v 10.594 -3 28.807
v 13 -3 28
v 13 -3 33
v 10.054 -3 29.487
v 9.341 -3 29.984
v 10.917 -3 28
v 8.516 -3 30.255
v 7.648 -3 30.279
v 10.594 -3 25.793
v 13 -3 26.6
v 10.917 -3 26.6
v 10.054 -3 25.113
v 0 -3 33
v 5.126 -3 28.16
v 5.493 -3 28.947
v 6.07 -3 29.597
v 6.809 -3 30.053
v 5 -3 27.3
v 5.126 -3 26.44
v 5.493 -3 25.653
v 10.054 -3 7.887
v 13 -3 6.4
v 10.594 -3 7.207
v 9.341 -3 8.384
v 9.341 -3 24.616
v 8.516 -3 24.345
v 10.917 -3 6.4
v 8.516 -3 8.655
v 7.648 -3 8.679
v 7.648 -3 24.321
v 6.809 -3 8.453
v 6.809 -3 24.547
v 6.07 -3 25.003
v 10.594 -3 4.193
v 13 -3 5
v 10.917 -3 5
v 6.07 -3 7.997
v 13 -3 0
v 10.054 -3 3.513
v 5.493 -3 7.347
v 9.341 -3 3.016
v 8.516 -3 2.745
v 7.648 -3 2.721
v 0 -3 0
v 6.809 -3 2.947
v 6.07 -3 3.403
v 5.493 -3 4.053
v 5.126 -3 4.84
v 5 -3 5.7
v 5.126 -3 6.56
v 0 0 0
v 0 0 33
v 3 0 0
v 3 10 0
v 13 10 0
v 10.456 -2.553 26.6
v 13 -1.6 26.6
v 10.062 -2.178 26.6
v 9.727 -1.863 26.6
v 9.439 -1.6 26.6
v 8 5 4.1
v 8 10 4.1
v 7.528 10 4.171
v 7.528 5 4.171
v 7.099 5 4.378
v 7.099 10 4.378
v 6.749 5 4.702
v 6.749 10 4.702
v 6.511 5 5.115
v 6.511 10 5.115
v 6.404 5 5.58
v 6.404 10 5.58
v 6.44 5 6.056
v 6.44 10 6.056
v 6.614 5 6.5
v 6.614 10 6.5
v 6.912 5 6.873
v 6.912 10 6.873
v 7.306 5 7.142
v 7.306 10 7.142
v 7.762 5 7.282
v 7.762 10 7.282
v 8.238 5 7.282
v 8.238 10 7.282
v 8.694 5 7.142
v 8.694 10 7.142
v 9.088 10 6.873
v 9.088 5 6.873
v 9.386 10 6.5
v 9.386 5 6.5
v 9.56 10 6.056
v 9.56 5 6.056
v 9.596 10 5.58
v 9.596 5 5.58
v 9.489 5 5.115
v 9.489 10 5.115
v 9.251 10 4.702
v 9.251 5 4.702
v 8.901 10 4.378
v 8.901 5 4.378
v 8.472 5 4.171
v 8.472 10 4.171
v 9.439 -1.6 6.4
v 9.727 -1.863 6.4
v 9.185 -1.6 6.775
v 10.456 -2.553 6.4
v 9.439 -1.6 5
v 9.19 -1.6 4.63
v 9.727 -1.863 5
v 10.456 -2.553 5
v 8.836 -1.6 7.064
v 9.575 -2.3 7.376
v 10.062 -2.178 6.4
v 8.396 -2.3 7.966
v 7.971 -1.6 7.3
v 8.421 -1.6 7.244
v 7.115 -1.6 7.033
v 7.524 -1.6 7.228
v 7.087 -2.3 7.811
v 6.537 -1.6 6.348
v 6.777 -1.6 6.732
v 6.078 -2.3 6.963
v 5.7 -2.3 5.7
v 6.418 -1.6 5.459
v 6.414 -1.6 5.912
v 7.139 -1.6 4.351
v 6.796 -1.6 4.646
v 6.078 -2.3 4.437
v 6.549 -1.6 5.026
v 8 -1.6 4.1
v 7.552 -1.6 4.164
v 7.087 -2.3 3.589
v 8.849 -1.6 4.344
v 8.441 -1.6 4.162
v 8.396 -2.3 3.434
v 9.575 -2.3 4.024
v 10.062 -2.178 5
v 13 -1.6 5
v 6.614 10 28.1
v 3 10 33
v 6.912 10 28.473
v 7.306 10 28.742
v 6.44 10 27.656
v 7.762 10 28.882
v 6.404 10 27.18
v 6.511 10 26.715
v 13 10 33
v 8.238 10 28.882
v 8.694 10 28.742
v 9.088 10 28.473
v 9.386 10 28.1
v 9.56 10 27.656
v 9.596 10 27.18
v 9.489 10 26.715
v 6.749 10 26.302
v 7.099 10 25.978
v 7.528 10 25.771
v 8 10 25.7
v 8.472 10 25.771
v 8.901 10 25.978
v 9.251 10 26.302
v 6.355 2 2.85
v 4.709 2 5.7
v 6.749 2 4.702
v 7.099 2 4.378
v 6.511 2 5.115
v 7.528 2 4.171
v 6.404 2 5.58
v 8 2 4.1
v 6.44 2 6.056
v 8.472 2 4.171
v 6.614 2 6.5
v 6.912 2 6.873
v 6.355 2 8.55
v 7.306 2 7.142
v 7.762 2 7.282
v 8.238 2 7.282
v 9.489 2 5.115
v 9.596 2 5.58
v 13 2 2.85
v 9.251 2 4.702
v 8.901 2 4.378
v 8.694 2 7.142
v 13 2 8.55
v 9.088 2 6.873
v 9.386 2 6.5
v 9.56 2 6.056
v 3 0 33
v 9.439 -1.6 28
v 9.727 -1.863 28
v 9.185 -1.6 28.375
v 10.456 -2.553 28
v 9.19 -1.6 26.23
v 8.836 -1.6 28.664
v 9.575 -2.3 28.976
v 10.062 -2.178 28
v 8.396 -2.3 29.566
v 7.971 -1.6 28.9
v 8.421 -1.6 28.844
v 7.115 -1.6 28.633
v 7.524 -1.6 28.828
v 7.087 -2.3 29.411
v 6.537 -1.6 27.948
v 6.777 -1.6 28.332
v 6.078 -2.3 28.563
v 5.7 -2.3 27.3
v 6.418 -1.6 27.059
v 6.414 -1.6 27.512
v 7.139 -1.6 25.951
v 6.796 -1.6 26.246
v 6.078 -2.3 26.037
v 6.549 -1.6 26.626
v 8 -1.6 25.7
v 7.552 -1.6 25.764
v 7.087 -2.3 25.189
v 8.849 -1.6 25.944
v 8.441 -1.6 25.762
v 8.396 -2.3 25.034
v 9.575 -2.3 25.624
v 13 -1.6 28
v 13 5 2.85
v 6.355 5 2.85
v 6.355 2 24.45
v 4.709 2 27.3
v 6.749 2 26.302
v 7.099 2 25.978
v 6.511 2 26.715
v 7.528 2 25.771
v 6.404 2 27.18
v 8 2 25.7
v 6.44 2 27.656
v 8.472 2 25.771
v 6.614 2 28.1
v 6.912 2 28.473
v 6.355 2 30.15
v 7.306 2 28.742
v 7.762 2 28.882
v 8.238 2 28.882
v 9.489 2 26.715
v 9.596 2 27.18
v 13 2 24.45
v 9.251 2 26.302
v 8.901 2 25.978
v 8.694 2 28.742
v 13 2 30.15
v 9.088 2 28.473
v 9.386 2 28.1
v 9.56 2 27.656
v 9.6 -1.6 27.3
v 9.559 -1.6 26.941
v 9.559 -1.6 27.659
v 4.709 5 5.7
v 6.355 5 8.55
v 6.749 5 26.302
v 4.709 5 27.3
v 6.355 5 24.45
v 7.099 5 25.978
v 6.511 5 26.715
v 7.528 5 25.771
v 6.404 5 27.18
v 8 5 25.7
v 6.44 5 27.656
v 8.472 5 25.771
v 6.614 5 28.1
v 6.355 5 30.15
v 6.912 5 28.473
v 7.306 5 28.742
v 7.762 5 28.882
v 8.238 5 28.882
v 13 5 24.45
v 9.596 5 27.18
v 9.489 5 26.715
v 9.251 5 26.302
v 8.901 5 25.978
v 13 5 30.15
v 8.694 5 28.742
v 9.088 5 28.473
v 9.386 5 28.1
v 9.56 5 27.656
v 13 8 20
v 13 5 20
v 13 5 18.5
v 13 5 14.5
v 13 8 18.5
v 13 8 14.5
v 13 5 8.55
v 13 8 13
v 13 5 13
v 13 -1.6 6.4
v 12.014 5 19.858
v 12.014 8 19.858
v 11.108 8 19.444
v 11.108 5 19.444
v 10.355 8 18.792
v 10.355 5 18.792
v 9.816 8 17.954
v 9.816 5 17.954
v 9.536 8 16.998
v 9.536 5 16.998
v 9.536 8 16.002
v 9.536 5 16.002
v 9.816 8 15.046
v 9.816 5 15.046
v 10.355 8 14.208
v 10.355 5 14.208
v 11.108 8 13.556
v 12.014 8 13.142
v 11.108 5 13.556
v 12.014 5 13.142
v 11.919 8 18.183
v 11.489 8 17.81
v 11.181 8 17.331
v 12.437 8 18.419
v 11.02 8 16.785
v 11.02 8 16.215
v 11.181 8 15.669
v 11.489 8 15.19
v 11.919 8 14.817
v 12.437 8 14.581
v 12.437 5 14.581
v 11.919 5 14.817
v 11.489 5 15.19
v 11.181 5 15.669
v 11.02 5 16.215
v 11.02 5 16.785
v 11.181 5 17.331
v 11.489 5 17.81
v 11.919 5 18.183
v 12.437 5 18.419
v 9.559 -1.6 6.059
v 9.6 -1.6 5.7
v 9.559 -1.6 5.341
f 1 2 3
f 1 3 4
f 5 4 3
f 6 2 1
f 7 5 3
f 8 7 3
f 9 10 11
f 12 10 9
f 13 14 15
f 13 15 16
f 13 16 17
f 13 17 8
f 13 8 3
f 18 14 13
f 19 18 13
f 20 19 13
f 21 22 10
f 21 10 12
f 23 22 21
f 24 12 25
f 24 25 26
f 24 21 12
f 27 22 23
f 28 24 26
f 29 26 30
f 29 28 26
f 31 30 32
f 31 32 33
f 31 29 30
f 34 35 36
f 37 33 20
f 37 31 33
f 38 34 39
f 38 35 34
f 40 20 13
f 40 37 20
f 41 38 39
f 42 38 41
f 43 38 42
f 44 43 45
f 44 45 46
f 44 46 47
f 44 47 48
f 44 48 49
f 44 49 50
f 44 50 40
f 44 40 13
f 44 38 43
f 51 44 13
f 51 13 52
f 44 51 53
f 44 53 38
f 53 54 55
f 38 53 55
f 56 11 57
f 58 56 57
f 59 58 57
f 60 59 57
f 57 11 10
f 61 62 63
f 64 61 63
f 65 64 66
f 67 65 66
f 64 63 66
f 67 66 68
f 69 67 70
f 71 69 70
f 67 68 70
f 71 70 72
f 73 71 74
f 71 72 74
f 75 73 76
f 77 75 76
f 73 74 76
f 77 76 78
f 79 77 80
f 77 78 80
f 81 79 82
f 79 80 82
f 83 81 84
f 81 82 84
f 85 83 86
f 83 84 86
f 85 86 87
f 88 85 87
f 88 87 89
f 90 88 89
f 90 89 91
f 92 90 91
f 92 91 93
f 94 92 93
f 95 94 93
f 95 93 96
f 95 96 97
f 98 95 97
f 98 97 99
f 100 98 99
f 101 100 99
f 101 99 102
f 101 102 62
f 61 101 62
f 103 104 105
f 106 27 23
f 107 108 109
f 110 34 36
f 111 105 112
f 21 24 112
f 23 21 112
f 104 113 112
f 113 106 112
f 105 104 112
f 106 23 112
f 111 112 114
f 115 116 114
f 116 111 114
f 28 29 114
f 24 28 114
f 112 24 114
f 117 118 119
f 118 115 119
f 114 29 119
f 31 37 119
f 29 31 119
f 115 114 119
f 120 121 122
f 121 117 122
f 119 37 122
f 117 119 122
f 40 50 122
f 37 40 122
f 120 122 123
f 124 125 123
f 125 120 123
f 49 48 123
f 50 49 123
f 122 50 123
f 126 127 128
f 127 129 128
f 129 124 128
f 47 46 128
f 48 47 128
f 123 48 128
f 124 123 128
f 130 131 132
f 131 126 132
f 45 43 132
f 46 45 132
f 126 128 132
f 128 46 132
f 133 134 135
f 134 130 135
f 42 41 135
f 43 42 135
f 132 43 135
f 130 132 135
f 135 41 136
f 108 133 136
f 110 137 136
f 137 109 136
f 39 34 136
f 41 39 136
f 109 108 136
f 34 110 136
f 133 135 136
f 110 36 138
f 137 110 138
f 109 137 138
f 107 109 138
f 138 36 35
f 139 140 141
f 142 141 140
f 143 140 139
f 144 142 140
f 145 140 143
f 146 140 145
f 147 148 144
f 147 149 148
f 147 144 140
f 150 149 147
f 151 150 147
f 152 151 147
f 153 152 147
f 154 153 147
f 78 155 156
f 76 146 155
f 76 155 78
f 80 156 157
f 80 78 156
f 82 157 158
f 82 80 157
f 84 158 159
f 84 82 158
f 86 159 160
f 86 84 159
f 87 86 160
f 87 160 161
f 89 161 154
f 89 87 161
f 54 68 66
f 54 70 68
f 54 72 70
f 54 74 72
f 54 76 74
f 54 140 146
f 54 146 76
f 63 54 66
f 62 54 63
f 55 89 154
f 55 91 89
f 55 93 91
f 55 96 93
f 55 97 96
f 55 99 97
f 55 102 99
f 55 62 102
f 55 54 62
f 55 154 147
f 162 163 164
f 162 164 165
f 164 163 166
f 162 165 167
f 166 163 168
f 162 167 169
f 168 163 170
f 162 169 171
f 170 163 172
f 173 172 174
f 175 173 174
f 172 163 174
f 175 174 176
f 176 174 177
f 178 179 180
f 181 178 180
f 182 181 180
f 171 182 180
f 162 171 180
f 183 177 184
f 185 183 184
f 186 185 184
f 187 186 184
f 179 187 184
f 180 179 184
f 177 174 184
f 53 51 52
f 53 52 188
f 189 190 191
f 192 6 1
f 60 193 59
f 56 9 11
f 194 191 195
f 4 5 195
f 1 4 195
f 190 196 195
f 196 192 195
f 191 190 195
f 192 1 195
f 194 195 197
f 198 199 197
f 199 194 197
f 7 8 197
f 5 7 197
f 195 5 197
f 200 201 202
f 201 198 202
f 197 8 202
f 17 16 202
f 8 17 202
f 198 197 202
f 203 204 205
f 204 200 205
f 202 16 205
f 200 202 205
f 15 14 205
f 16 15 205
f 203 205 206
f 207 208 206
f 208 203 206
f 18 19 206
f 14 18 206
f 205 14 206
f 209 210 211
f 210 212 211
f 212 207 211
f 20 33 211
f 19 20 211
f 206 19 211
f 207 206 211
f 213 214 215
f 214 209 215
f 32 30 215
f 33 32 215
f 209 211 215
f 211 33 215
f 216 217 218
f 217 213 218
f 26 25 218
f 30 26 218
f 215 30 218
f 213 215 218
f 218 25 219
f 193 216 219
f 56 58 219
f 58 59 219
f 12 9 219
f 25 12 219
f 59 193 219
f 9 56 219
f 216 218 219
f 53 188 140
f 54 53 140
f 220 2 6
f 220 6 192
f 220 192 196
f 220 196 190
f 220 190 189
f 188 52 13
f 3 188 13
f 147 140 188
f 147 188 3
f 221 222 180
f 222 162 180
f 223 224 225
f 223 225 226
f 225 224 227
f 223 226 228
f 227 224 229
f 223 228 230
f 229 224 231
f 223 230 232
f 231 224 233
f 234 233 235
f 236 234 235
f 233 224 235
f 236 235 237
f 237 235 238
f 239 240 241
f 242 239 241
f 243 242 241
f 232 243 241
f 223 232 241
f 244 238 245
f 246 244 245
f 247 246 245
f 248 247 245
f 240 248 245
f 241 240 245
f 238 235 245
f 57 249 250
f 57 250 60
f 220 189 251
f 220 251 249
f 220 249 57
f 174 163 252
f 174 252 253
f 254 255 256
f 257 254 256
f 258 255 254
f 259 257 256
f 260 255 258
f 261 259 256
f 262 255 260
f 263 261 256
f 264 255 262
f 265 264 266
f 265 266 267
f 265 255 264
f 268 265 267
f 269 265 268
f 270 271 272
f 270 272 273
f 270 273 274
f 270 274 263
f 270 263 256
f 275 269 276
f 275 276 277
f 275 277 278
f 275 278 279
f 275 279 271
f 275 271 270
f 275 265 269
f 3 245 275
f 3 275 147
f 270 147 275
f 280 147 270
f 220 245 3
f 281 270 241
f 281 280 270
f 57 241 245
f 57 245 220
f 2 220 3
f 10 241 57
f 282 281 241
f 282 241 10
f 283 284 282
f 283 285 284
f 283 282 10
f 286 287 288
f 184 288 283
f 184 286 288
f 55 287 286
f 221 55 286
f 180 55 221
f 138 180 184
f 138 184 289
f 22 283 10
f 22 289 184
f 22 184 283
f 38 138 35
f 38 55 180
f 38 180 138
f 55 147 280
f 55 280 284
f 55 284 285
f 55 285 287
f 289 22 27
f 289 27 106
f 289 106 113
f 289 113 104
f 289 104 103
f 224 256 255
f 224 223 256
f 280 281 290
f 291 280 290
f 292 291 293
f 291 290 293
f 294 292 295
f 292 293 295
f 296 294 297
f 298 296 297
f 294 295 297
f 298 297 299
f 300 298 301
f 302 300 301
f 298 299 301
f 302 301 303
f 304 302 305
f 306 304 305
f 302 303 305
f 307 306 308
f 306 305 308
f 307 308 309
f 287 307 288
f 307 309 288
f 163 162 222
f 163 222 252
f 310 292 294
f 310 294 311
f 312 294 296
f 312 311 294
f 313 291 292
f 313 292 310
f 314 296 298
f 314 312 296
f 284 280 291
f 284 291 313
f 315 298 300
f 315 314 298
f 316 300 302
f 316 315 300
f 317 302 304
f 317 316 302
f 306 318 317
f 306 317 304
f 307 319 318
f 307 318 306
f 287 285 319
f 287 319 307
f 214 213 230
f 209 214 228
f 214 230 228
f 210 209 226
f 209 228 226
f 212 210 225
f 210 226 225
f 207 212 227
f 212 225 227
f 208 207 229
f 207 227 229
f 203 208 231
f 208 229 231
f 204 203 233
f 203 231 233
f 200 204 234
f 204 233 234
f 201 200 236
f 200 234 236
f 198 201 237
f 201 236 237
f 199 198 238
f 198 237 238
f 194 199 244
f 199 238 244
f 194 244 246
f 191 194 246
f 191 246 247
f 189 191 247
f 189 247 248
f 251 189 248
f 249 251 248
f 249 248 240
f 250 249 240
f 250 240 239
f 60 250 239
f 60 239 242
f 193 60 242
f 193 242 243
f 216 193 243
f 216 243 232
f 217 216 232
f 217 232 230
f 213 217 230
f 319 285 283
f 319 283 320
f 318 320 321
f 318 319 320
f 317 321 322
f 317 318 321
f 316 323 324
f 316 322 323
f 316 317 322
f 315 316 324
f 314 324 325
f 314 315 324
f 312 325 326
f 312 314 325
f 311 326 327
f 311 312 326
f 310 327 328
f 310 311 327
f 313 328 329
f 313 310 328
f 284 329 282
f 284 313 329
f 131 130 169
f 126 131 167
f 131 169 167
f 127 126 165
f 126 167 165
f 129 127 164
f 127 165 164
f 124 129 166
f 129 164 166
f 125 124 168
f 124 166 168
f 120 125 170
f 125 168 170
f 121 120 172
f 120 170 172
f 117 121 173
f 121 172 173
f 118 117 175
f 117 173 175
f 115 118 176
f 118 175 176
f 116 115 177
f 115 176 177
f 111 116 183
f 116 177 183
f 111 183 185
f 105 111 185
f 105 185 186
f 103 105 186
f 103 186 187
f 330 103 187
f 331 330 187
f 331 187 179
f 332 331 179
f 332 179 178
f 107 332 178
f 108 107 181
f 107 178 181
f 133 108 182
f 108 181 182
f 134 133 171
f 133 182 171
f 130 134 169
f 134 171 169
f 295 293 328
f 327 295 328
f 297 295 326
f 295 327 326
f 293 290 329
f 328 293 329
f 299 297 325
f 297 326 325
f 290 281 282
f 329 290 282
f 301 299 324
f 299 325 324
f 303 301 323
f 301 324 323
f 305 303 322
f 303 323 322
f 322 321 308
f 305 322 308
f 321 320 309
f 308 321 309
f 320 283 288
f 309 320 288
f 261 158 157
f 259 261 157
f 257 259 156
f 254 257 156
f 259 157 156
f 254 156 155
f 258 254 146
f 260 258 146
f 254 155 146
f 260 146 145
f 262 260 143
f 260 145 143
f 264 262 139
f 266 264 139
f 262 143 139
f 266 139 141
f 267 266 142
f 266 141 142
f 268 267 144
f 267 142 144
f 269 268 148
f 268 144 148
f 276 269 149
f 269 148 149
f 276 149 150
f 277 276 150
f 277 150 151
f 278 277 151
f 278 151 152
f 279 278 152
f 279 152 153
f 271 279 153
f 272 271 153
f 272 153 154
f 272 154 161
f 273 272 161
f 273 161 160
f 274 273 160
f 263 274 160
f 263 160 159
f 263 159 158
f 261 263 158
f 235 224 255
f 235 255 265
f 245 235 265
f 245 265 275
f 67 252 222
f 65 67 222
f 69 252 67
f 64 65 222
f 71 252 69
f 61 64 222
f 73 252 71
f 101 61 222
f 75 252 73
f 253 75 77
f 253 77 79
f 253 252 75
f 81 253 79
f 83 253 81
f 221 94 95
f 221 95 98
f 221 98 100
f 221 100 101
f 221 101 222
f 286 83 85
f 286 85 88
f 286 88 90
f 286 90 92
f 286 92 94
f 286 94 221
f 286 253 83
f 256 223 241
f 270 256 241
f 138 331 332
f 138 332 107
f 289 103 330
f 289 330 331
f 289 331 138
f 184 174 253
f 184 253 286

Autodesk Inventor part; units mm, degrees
ref_plane "YZ Plane" through (0, 0, 0) normal (1, 0, 0) x (0, 1, 0)
ref_plane "XZ Plane" through (0, 0, 0) normal (0, 1, 0) x (-1, 0, 0)
sketch "Sketch1" plane through (0, 0, 0) normal (0, 0, 1) x (1, 0, 0)
  line L0 (0, 0) -> (3, 0)
  line L1 (3, 0) -> (3, 10)
  line L2 (3, 10) -> (13, 10)
  line L3 (13, 10) -> (13, -3)
  line L4 (13, -3) -> (0, -3)
  line L5 (0, -3) -> (0, 0)
  dimension "d0" = 10
  dimension "d1" = 3
  dimension "d2" = 3
  dimension "d3" = 10
extrude "Extrusion1" add sketch "Sketch1" along normal blind 33
sketch "Sketch2" plane through (0, -3, 0) normal (0, -1, 0) x (1, 0, 0)
  line L0 (13, 0) -> (3, 0) projected
  line L1 (3, 0) -> (3, 33) projected
  line L2 (13, 33) -> (3, 33) projected
  line L3 (13, 0) -> (13, 33) projected
  line L4 (0, 33) -> (13, 33) projected
  line L5 (6.3546, 24.45) -> (4.7091, 27.3)
  line L6 (4.7091, 27.3) -> (6.3546, 30.15)
  line L7 (6.3546, 30.15) -> (9.6454, 30.15)
  line L8 (9.6454, 30.15) -> (11.2909, 27.3) construction
  line L9 (11.2909, 27.3) -> (9.6454, 24.45) construction
  line L10 (9.6454, 24.45) -> (6.3546, 24.45)
  line L11 (6.3546, 2.85) -> (4.7091, 5.7)
  line L12 (4.7091, 5.7) -> (6.3546, 8.55)
  line L13 (6.3546, 8.55) -> (9.6454, 8.55)
  line L14 (9.6454, 8.55) -> (11.2909, 5.7) construction
  line L15 (11.2909, 5.7) -> (9.6454, 2.85) construction
  line L16 (9.6454, 2.85) -> (6.3546, 2.85)
  line L17 (9.6454, 30.15) -> (9.6454, 24.45) construction
  line L18 (9.6454, 24.45) -> (13, 24.45)
  line L19 (13, 24.45) -> (13, 30.15)
  line L20 (13, 30.15) -> (9.6454, 30.15)
  line L21 (9.6454, 8.55) -> (9.6454, 2.85) construction
  line L22 (9.6454, 2.85) -> (13, 2.85)
  line L23 (13, 2.85) -> (13, 8.55)
  line L24 (13, 8.55) -> (9.6454, 8.55)
  line L25 (13, 0) -> (13, 33) projected
  point P0 (0, 0)
  point P1 (8, 27.3)
  point P2 (8, 5.7)
  point P3 (8, 33)
  point P4 (6.5, 33)
  point P5 (8, 27.3)
  point P6 (8, 5.7)
  point P7 (13, 8.55)
  point P8 (13, 30.15)
  dimension "d6" = 21.6
  dimension "d7" = 5.7
  dimension "d8" = 5.7
  dimension "d19" = 5.7
hole "Hole1" at (8, -3, 27.3) at (8, -3, 5.7) direction (0, 1, 0) diameter 3.2 end through all countersink diameter 6 countersink angle 90
sketch "Sketch3" plane through (0, -3, 0) normal (0, -1, 0) x (1, 0, 0)
  circle A0 centre (8, 27.3) radius 3 projected
  circle A1 centre (8, 5.7) radius 3 projected
  line L0 (0, 0) -> (13, 0) projected
  line L1 (13, 0) -> (13, 33) projected
  line L2 (0, 33) -> (13, 33) projected
  line L3 (0, 0) -> (0, 33) projected
  circle A2 centre (8, 5.7) radius 3 projected
  circle A3 centre (8, 5.7) radius 1.6 projected
  circle A4 centre (8, 27.3) radius 3 projected
  circle A5 centre (8, 27.3) radius 1.6 projected
  line L4 (13, 28) -> (8, 28)
  line L5 (8, 28) -> (8, 26.6)
  line L6 (8, 26.6) -> (13, 26.6)
  line L7 (13, 26.6) -> (13, 28)
  line L8 (13, 6.4) -> (8, 6.4)
  line L9 (8, 6.4) -> (8, 5)
  line L10 (8, 5) -> (13, 5)
  line L11 (13, 5) -> (13, 6.4)
  point P0 (0, 0)
  point P1 (13, 16.5)
  dimension "d16" = 1.4
extrude "Extrusion2" cut sketch "Sketch3" against normal blind 1.4 contours A0 L6 A5 L4 | A0 L4 L1 L6 | A5 L6 L5 L4 | L1 L10 A1 L8 | A1 L10 A3 L8 | A3 L10 L9 L8 picked at (10.0575, 27.1414) picked at (8.5333, 27.3) picked at (10.0575, 5.8586) picked at (8.5333, 5.7)
ref_plane "Work Plane1" through (0, 2, 0) normal (0, -1, 0) x (1, 0, 0)
extrude "Extrusion3" cut sketch "Sketch2" against normal blind 3 from surface at -5 contours L22 L16 L11 L12 L13 L24 L3 | L18 L10 L5 L6 L7 L20 L3
sketch "Sketch4" plane through (13, -3, 0) normal (1, 0, 0) x (0, 0, -1)
  line L0 (0, 13) -> (-33, 13) projected
  line L1 (-16.5, 13) -> (-16.5, 0)
  line L2 (-6.4, 0) -> (-26.6, 0) projected
  line L3 (-14.5, 11) -> (-13, 11)
  line L4 (-13, 11) -> (-13, 8)
  line L5 (-13, 8) -> (-14.5, 8)
  line L6 (-14.5, 8) -> (-14.5, 11)
  point P0 (0, 3)
  dimension "d23" = 3
  dimension "d24" = 1.5
  dimension "d25" = 2
  dimension "d26" = 2
revolve "Revolution1" cut sketch "Sketch4" angle 360 about axis through (13, 10, 16.5) along (0, -1, 0)
equation "\"d7\" = d8"
properties part number "hotend magnet"
